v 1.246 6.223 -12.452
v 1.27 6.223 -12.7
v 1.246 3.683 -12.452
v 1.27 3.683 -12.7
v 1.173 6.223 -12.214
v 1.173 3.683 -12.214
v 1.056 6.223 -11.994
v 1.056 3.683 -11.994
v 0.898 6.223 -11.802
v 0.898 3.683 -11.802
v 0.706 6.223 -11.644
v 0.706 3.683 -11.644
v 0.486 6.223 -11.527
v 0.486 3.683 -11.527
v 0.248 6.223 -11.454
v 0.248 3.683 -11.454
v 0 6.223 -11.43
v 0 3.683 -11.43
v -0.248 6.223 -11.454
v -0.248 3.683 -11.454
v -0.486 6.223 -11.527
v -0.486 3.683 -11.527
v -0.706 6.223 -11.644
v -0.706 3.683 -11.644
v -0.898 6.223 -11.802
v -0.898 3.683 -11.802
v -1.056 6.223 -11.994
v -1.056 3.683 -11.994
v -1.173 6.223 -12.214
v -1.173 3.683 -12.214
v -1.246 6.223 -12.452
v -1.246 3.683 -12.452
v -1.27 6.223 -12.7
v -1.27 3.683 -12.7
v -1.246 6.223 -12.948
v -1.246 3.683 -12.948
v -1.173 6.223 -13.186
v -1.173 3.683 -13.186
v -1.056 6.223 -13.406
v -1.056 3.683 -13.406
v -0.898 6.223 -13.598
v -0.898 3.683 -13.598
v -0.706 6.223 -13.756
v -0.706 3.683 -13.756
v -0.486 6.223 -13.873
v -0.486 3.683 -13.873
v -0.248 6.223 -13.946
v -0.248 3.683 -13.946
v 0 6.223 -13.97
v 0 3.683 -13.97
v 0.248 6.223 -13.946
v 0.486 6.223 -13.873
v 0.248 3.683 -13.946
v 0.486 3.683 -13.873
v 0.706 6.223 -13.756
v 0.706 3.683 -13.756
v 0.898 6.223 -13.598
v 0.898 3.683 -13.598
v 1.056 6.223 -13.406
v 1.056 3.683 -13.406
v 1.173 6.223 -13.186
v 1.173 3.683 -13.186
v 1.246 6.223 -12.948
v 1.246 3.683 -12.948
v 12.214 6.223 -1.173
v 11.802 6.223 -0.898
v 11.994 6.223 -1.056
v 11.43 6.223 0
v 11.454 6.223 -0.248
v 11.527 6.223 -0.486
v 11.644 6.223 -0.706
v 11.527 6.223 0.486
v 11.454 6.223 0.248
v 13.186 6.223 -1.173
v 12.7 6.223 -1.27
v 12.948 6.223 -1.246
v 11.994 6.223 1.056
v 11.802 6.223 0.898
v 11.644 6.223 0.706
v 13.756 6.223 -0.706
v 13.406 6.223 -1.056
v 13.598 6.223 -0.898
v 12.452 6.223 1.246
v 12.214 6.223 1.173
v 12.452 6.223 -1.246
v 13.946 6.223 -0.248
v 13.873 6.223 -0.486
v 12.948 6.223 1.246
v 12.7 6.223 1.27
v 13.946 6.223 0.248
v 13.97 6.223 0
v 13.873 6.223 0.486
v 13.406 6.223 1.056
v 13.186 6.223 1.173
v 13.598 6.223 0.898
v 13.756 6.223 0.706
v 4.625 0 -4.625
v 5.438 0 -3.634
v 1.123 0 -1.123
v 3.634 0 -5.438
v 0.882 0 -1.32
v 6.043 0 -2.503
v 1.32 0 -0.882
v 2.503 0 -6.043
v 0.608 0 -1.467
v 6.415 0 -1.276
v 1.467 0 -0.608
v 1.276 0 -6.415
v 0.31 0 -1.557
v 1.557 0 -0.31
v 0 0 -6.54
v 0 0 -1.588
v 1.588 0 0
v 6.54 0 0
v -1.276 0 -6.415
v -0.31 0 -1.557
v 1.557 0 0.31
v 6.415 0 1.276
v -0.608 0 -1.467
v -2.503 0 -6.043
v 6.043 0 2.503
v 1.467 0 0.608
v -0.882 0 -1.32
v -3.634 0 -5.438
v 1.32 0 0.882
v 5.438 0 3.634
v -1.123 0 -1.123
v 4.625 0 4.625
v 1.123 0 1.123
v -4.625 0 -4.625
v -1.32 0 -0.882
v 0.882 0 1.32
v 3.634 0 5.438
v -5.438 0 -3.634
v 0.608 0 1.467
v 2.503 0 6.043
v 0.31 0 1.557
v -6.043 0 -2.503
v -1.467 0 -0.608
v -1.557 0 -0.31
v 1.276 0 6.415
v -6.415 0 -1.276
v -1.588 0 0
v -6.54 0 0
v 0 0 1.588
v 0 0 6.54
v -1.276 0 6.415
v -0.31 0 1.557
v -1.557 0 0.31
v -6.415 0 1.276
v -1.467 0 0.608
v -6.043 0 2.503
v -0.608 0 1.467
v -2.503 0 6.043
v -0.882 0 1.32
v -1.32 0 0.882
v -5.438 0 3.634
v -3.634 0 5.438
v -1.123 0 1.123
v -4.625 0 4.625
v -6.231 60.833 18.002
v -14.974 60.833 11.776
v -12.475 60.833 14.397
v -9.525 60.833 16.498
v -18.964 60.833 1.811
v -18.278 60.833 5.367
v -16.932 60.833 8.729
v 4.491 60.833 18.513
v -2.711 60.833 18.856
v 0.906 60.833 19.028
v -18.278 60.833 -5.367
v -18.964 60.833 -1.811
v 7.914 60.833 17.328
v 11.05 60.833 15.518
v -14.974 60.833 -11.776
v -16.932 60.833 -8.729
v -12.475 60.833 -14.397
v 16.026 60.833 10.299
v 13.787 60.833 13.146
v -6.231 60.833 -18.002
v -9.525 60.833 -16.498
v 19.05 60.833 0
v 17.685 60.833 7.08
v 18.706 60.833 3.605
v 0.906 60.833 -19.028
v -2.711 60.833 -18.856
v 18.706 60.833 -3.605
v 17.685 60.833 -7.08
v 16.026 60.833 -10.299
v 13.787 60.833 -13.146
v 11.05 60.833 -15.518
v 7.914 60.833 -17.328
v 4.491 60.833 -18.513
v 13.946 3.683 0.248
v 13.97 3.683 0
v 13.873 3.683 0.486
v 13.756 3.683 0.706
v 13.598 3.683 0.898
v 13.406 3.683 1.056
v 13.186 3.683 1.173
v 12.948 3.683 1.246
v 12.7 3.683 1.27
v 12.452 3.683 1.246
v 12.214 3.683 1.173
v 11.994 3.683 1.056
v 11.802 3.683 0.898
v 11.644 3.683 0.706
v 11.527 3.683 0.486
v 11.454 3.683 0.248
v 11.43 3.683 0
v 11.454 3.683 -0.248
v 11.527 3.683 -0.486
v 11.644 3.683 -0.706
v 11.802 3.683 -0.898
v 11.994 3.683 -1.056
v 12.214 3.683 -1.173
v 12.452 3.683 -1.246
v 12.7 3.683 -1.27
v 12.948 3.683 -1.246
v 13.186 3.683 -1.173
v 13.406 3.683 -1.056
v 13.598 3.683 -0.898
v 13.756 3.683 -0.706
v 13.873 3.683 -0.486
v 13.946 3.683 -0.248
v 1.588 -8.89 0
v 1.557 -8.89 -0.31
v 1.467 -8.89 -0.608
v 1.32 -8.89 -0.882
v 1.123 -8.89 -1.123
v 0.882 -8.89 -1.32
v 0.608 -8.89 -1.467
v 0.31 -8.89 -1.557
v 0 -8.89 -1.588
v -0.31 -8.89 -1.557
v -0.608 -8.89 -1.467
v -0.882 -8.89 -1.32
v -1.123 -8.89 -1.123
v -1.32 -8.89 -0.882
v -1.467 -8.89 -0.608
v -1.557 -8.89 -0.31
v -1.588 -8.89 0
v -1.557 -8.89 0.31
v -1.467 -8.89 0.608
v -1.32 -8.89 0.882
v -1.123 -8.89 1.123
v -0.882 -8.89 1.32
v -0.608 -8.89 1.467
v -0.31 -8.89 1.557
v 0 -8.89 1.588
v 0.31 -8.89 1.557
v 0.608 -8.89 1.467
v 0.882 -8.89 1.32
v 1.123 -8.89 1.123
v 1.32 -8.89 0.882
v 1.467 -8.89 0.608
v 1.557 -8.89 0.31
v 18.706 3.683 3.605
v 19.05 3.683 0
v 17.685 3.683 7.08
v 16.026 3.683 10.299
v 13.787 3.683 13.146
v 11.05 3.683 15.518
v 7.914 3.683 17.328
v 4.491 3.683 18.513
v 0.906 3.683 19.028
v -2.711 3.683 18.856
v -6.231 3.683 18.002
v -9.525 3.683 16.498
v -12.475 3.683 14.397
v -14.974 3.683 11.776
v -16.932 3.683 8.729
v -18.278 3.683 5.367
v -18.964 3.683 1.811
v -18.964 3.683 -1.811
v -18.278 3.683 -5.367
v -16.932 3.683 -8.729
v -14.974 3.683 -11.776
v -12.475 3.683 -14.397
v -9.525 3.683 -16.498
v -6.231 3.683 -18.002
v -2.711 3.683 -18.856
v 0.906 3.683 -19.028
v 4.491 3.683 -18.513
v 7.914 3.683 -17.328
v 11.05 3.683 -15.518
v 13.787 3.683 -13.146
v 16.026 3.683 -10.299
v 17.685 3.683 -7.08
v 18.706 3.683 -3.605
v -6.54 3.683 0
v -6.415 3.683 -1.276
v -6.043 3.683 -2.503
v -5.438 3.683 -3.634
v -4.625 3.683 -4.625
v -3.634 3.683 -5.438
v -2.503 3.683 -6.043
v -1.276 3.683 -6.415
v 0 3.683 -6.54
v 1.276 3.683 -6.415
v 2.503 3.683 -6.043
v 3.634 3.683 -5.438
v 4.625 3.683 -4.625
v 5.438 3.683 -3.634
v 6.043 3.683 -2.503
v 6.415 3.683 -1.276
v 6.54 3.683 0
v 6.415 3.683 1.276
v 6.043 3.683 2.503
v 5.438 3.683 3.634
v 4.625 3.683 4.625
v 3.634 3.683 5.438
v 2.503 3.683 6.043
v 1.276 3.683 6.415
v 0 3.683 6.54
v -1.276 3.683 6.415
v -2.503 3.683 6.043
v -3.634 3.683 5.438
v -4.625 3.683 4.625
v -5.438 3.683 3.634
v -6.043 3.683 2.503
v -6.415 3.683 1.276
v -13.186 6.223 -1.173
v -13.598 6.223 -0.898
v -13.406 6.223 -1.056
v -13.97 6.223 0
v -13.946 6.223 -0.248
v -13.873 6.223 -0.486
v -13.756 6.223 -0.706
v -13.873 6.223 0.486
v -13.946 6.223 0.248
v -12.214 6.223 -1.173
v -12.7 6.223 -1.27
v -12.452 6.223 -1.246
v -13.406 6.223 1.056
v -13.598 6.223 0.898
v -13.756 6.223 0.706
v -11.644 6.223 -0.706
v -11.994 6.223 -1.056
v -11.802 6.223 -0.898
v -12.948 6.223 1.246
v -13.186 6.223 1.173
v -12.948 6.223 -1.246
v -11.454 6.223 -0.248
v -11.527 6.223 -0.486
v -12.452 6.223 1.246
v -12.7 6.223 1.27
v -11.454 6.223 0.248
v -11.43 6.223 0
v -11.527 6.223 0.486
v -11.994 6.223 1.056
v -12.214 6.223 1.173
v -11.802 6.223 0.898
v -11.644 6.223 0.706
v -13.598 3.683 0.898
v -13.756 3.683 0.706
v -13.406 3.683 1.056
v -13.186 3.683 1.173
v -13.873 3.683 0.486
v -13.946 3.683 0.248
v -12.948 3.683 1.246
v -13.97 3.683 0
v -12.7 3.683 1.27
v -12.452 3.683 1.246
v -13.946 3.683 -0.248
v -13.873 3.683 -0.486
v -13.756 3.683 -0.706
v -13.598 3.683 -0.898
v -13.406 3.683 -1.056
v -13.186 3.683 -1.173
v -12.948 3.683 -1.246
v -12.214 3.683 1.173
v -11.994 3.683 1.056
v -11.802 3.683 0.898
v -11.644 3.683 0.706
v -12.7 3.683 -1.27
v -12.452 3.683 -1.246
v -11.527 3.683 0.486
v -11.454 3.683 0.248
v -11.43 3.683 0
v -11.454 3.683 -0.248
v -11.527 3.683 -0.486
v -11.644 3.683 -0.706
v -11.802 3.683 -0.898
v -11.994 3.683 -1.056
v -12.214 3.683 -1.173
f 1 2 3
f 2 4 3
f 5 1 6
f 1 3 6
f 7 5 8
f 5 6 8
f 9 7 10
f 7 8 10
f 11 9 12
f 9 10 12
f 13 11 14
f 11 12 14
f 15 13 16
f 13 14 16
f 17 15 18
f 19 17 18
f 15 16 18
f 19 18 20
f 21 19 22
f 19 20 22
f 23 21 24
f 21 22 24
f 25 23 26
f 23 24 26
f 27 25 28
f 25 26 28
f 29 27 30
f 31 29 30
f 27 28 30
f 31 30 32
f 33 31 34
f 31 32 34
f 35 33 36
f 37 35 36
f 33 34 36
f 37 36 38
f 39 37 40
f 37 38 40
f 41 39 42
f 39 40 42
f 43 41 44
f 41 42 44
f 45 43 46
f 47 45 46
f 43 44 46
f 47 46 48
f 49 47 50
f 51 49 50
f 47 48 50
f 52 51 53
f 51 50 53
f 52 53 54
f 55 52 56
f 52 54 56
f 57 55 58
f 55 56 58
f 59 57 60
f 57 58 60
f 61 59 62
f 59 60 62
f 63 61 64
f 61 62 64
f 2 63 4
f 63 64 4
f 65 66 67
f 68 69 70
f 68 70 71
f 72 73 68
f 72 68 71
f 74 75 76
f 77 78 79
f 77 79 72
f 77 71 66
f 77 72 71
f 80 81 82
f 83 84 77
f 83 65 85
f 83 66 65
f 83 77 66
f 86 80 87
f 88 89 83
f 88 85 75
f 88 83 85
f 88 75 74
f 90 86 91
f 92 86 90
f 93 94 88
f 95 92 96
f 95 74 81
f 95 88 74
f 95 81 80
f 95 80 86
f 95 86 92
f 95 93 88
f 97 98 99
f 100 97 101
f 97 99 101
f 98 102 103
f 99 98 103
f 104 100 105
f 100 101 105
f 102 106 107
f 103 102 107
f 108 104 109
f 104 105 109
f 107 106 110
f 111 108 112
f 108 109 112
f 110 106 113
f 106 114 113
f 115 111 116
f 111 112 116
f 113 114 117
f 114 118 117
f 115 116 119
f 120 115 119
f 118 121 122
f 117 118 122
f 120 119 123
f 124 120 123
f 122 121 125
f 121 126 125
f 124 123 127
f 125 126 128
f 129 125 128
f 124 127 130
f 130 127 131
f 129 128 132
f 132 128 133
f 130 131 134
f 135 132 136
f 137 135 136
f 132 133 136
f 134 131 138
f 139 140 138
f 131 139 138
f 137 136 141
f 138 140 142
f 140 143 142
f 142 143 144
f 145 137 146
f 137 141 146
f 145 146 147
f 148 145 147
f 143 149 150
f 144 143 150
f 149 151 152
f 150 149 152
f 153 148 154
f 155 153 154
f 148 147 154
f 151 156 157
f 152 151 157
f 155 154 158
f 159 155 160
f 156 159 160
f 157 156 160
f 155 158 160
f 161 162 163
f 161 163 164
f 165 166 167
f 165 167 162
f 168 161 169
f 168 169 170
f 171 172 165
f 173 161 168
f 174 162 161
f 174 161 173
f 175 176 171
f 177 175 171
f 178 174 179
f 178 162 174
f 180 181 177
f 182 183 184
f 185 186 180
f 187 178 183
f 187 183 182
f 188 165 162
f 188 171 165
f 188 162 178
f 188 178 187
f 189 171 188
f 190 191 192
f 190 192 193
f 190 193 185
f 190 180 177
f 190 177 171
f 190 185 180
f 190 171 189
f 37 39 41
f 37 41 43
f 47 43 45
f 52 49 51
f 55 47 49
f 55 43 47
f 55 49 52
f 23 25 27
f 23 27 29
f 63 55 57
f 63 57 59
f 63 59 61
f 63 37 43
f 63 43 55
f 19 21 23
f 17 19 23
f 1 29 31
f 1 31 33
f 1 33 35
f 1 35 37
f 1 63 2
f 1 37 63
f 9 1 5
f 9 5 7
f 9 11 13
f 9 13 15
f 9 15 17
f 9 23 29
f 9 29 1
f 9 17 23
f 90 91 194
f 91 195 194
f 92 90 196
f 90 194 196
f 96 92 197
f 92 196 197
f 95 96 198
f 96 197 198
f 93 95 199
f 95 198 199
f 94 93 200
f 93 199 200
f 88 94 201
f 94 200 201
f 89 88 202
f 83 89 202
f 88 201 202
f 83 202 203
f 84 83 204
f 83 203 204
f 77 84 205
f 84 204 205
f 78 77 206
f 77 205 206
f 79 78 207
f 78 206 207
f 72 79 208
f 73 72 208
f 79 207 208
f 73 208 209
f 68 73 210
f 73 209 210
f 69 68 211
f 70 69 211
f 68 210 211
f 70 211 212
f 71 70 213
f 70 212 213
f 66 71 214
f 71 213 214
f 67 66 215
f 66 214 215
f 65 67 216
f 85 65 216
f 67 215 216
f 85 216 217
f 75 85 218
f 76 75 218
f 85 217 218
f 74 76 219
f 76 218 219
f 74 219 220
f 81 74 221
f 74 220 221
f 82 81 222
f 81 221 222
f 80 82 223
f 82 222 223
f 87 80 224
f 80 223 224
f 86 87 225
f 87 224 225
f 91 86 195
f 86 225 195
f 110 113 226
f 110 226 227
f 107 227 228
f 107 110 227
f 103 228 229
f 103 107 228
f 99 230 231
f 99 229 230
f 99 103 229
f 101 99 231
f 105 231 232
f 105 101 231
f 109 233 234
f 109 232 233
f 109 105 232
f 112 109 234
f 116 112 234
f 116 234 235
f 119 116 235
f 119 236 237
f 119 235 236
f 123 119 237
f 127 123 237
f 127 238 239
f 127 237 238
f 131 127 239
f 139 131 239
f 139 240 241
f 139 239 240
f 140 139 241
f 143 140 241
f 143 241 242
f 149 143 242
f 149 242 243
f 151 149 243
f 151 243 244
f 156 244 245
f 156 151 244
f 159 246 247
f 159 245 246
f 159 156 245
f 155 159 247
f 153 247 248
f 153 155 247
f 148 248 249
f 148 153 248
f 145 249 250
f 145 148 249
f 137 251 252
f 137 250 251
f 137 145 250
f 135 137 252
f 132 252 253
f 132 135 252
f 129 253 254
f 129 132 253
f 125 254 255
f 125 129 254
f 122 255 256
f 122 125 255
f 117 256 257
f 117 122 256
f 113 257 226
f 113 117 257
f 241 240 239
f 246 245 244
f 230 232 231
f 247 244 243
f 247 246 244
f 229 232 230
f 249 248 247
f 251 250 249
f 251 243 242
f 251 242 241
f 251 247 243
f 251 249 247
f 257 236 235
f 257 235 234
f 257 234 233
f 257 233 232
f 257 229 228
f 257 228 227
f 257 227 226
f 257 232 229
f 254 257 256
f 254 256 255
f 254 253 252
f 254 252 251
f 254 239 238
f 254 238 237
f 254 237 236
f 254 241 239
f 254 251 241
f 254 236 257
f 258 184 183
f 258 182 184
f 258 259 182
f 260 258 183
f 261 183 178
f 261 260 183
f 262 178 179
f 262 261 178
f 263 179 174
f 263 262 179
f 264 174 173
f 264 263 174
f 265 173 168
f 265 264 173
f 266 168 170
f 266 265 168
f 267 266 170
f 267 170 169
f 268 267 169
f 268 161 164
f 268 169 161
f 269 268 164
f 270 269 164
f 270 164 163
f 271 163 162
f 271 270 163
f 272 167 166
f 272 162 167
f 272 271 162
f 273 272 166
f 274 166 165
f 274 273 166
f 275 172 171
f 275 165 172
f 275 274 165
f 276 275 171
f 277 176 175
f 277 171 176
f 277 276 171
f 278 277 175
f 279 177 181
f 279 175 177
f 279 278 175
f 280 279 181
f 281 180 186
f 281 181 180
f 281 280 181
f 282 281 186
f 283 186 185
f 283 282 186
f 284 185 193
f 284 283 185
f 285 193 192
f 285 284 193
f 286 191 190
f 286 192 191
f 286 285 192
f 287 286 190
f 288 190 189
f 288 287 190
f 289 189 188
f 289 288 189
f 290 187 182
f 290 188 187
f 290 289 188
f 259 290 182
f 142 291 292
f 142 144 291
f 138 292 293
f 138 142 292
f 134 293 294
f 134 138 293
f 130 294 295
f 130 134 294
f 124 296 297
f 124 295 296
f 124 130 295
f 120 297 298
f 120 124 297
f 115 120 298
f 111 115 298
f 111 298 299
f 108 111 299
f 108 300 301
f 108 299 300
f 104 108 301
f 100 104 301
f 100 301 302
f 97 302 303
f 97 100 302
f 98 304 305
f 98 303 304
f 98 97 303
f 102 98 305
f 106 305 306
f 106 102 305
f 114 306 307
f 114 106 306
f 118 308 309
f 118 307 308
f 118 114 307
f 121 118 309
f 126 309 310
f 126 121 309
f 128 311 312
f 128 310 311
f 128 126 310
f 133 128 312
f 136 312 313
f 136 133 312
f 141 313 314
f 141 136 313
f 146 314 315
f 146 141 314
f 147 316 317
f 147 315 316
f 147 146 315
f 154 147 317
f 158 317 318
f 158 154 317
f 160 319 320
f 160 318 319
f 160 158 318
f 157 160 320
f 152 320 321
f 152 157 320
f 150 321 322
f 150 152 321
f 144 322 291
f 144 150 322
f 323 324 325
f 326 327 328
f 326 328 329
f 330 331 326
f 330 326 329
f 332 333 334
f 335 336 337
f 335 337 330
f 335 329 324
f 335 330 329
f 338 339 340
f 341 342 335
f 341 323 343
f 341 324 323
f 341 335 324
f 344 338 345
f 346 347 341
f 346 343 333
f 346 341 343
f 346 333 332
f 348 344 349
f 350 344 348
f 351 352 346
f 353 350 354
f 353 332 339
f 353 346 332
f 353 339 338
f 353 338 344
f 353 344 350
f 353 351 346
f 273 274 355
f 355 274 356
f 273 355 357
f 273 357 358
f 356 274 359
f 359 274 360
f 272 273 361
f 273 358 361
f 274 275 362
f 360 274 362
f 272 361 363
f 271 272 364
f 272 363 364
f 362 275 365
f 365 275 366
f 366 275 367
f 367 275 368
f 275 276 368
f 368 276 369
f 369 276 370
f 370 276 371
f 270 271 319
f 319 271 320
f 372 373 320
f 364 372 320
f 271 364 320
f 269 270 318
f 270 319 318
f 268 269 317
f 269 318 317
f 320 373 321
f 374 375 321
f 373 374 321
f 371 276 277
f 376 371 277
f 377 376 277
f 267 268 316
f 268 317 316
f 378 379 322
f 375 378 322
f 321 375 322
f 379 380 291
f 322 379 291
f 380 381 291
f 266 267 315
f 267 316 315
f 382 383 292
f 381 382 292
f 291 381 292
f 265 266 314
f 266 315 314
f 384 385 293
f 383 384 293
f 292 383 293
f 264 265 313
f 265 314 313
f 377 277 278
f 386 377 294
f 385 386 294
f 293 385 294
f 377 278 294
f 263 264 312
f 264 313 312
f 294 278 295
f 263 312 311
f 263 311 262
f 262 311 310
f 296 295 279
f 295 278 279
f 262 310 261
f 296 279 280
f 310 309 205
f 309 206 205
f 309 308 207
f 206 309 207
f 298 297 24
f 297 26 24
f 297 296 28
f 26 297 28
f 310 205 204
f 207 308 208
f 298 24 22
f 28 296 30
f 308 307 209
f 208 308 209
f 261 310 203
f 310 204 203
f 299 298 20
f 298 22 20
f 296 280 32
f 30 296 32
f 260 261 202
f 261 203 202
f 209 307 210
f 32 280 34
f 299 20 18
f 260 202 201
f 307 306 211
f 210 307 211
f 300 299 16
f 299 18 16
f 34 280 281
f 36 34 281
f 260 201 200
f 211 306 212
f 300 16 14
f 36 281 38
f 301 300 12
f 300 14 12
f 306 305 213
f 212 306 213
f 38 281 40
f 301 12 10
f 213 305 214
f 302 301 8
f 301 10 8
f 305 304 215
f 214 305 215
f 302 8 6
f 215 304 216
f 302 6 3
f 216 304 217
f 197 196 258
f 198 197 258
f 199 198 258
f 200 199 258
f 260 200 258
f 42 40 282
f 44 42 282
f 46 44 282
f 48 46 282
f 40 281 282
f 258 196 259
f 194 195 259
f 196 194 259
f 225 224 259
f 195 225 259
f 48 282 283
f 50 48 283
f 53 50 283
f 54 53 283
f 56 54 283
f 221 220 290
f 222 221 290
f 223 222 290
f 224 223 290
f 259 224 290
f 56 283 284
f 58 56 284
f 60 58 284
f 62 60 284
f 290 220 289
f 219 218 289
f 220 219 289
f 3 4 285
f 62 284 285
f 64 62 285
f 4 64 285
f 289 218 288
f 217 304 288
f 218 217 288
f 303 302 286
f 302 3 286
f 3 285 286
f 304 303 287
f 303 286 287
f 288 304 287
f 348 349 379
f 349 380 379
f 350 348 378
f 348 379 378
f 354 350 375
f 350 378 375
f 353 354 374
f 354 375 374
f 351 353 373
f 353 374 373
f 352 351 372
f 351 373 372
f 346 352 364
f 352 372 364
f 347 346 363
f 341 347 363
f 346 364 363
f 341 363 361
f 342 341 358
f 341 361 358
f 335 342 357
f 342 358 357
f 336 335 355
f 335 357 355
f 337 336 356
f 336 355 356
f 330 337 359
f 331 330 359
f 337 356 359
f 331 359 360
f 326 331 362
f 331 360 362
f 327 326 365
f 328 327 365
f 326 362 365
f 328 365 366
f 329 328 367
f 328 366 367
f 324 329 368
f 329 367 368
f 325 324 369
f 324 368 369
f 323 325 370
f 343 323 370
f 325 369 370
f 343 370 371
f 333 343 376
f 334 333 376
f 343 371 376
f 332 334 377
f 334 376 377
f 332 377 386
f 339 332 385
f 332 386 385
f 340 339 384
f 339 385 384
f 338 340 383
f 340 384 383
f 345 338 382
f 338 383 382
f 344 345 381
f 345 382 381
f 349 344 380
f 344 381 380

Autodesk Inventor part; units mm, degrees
ref_plane "YZ Plane" through (0, 0, 0) normal (1, 0, 0) x (0, 1, 0)
ref_plane "XZ Plane" through (0, 0, 0) normal (0, 1, 0) x (-1, 0, 0)
ref_plane "XY Plane" through (0, 0, 0) normal (0, 0, 1) x (1, 0, 0)
sketch "Sketch1" plane through (0, 0, 0) normal (0, 1, 0) x (-1, 0, 0)
  circle A0 centre (0, 0) radius 6.5405
  dimension "d0" = 13.081
extrude "Extrusion1" add sketch "Sketch1" along normal blind 3.683
sketch "Sketch2" plane through (0, 3.683, 0) normal (0, 1, 0) x (1, 0, 0)
  circle A0 centre (0, 0) radius 19.05
  dimension "d3" = 38.1
extrude "Extrusion2" add sketch "Sketch2" along normal blind 57.15
sketch "Sketch3" plane through (0, 0, 0) normal (0, -1, 0) x (1, 0, 0)
  circle A0 centre (0, 0) radius 1.5875
  dimension "d6" = 3.175
extrude "Extrusion3" add sketch "Sketch3" along normal blind 8.89
sketch "Sketch4" plane through (0, 3.683, 0) normal (0, -1, 0) x (1, 0, 0)
  circle A0 centre (0, 0) radius 19.05 projected
  circle A1 centre (0, 0) radius 12.7 construction
  circle A2 centre (0, 0) radius 1.5875 projected
  line L0 (0, 0) -> (0, -12.7) construction
  line L1 (0, 0) -> (-12.7, 0) construction
  line L2 (0, 0) -> (12.7, 0) construction
  circle A3 centre (0, -12.7) radius 1.27
  circle A4 centre (-12.7, 0) radius 1.27
  circle A5 centre (12.7, 0) radius 1.27
  dimension "d9" = 25.4
  dimension "d10" = 2.54
extrude "Extrusion4" cut sketch "Sketch4" against normal blind 2.54 contours A3 | A4 | A5
properties part number "Motor"
